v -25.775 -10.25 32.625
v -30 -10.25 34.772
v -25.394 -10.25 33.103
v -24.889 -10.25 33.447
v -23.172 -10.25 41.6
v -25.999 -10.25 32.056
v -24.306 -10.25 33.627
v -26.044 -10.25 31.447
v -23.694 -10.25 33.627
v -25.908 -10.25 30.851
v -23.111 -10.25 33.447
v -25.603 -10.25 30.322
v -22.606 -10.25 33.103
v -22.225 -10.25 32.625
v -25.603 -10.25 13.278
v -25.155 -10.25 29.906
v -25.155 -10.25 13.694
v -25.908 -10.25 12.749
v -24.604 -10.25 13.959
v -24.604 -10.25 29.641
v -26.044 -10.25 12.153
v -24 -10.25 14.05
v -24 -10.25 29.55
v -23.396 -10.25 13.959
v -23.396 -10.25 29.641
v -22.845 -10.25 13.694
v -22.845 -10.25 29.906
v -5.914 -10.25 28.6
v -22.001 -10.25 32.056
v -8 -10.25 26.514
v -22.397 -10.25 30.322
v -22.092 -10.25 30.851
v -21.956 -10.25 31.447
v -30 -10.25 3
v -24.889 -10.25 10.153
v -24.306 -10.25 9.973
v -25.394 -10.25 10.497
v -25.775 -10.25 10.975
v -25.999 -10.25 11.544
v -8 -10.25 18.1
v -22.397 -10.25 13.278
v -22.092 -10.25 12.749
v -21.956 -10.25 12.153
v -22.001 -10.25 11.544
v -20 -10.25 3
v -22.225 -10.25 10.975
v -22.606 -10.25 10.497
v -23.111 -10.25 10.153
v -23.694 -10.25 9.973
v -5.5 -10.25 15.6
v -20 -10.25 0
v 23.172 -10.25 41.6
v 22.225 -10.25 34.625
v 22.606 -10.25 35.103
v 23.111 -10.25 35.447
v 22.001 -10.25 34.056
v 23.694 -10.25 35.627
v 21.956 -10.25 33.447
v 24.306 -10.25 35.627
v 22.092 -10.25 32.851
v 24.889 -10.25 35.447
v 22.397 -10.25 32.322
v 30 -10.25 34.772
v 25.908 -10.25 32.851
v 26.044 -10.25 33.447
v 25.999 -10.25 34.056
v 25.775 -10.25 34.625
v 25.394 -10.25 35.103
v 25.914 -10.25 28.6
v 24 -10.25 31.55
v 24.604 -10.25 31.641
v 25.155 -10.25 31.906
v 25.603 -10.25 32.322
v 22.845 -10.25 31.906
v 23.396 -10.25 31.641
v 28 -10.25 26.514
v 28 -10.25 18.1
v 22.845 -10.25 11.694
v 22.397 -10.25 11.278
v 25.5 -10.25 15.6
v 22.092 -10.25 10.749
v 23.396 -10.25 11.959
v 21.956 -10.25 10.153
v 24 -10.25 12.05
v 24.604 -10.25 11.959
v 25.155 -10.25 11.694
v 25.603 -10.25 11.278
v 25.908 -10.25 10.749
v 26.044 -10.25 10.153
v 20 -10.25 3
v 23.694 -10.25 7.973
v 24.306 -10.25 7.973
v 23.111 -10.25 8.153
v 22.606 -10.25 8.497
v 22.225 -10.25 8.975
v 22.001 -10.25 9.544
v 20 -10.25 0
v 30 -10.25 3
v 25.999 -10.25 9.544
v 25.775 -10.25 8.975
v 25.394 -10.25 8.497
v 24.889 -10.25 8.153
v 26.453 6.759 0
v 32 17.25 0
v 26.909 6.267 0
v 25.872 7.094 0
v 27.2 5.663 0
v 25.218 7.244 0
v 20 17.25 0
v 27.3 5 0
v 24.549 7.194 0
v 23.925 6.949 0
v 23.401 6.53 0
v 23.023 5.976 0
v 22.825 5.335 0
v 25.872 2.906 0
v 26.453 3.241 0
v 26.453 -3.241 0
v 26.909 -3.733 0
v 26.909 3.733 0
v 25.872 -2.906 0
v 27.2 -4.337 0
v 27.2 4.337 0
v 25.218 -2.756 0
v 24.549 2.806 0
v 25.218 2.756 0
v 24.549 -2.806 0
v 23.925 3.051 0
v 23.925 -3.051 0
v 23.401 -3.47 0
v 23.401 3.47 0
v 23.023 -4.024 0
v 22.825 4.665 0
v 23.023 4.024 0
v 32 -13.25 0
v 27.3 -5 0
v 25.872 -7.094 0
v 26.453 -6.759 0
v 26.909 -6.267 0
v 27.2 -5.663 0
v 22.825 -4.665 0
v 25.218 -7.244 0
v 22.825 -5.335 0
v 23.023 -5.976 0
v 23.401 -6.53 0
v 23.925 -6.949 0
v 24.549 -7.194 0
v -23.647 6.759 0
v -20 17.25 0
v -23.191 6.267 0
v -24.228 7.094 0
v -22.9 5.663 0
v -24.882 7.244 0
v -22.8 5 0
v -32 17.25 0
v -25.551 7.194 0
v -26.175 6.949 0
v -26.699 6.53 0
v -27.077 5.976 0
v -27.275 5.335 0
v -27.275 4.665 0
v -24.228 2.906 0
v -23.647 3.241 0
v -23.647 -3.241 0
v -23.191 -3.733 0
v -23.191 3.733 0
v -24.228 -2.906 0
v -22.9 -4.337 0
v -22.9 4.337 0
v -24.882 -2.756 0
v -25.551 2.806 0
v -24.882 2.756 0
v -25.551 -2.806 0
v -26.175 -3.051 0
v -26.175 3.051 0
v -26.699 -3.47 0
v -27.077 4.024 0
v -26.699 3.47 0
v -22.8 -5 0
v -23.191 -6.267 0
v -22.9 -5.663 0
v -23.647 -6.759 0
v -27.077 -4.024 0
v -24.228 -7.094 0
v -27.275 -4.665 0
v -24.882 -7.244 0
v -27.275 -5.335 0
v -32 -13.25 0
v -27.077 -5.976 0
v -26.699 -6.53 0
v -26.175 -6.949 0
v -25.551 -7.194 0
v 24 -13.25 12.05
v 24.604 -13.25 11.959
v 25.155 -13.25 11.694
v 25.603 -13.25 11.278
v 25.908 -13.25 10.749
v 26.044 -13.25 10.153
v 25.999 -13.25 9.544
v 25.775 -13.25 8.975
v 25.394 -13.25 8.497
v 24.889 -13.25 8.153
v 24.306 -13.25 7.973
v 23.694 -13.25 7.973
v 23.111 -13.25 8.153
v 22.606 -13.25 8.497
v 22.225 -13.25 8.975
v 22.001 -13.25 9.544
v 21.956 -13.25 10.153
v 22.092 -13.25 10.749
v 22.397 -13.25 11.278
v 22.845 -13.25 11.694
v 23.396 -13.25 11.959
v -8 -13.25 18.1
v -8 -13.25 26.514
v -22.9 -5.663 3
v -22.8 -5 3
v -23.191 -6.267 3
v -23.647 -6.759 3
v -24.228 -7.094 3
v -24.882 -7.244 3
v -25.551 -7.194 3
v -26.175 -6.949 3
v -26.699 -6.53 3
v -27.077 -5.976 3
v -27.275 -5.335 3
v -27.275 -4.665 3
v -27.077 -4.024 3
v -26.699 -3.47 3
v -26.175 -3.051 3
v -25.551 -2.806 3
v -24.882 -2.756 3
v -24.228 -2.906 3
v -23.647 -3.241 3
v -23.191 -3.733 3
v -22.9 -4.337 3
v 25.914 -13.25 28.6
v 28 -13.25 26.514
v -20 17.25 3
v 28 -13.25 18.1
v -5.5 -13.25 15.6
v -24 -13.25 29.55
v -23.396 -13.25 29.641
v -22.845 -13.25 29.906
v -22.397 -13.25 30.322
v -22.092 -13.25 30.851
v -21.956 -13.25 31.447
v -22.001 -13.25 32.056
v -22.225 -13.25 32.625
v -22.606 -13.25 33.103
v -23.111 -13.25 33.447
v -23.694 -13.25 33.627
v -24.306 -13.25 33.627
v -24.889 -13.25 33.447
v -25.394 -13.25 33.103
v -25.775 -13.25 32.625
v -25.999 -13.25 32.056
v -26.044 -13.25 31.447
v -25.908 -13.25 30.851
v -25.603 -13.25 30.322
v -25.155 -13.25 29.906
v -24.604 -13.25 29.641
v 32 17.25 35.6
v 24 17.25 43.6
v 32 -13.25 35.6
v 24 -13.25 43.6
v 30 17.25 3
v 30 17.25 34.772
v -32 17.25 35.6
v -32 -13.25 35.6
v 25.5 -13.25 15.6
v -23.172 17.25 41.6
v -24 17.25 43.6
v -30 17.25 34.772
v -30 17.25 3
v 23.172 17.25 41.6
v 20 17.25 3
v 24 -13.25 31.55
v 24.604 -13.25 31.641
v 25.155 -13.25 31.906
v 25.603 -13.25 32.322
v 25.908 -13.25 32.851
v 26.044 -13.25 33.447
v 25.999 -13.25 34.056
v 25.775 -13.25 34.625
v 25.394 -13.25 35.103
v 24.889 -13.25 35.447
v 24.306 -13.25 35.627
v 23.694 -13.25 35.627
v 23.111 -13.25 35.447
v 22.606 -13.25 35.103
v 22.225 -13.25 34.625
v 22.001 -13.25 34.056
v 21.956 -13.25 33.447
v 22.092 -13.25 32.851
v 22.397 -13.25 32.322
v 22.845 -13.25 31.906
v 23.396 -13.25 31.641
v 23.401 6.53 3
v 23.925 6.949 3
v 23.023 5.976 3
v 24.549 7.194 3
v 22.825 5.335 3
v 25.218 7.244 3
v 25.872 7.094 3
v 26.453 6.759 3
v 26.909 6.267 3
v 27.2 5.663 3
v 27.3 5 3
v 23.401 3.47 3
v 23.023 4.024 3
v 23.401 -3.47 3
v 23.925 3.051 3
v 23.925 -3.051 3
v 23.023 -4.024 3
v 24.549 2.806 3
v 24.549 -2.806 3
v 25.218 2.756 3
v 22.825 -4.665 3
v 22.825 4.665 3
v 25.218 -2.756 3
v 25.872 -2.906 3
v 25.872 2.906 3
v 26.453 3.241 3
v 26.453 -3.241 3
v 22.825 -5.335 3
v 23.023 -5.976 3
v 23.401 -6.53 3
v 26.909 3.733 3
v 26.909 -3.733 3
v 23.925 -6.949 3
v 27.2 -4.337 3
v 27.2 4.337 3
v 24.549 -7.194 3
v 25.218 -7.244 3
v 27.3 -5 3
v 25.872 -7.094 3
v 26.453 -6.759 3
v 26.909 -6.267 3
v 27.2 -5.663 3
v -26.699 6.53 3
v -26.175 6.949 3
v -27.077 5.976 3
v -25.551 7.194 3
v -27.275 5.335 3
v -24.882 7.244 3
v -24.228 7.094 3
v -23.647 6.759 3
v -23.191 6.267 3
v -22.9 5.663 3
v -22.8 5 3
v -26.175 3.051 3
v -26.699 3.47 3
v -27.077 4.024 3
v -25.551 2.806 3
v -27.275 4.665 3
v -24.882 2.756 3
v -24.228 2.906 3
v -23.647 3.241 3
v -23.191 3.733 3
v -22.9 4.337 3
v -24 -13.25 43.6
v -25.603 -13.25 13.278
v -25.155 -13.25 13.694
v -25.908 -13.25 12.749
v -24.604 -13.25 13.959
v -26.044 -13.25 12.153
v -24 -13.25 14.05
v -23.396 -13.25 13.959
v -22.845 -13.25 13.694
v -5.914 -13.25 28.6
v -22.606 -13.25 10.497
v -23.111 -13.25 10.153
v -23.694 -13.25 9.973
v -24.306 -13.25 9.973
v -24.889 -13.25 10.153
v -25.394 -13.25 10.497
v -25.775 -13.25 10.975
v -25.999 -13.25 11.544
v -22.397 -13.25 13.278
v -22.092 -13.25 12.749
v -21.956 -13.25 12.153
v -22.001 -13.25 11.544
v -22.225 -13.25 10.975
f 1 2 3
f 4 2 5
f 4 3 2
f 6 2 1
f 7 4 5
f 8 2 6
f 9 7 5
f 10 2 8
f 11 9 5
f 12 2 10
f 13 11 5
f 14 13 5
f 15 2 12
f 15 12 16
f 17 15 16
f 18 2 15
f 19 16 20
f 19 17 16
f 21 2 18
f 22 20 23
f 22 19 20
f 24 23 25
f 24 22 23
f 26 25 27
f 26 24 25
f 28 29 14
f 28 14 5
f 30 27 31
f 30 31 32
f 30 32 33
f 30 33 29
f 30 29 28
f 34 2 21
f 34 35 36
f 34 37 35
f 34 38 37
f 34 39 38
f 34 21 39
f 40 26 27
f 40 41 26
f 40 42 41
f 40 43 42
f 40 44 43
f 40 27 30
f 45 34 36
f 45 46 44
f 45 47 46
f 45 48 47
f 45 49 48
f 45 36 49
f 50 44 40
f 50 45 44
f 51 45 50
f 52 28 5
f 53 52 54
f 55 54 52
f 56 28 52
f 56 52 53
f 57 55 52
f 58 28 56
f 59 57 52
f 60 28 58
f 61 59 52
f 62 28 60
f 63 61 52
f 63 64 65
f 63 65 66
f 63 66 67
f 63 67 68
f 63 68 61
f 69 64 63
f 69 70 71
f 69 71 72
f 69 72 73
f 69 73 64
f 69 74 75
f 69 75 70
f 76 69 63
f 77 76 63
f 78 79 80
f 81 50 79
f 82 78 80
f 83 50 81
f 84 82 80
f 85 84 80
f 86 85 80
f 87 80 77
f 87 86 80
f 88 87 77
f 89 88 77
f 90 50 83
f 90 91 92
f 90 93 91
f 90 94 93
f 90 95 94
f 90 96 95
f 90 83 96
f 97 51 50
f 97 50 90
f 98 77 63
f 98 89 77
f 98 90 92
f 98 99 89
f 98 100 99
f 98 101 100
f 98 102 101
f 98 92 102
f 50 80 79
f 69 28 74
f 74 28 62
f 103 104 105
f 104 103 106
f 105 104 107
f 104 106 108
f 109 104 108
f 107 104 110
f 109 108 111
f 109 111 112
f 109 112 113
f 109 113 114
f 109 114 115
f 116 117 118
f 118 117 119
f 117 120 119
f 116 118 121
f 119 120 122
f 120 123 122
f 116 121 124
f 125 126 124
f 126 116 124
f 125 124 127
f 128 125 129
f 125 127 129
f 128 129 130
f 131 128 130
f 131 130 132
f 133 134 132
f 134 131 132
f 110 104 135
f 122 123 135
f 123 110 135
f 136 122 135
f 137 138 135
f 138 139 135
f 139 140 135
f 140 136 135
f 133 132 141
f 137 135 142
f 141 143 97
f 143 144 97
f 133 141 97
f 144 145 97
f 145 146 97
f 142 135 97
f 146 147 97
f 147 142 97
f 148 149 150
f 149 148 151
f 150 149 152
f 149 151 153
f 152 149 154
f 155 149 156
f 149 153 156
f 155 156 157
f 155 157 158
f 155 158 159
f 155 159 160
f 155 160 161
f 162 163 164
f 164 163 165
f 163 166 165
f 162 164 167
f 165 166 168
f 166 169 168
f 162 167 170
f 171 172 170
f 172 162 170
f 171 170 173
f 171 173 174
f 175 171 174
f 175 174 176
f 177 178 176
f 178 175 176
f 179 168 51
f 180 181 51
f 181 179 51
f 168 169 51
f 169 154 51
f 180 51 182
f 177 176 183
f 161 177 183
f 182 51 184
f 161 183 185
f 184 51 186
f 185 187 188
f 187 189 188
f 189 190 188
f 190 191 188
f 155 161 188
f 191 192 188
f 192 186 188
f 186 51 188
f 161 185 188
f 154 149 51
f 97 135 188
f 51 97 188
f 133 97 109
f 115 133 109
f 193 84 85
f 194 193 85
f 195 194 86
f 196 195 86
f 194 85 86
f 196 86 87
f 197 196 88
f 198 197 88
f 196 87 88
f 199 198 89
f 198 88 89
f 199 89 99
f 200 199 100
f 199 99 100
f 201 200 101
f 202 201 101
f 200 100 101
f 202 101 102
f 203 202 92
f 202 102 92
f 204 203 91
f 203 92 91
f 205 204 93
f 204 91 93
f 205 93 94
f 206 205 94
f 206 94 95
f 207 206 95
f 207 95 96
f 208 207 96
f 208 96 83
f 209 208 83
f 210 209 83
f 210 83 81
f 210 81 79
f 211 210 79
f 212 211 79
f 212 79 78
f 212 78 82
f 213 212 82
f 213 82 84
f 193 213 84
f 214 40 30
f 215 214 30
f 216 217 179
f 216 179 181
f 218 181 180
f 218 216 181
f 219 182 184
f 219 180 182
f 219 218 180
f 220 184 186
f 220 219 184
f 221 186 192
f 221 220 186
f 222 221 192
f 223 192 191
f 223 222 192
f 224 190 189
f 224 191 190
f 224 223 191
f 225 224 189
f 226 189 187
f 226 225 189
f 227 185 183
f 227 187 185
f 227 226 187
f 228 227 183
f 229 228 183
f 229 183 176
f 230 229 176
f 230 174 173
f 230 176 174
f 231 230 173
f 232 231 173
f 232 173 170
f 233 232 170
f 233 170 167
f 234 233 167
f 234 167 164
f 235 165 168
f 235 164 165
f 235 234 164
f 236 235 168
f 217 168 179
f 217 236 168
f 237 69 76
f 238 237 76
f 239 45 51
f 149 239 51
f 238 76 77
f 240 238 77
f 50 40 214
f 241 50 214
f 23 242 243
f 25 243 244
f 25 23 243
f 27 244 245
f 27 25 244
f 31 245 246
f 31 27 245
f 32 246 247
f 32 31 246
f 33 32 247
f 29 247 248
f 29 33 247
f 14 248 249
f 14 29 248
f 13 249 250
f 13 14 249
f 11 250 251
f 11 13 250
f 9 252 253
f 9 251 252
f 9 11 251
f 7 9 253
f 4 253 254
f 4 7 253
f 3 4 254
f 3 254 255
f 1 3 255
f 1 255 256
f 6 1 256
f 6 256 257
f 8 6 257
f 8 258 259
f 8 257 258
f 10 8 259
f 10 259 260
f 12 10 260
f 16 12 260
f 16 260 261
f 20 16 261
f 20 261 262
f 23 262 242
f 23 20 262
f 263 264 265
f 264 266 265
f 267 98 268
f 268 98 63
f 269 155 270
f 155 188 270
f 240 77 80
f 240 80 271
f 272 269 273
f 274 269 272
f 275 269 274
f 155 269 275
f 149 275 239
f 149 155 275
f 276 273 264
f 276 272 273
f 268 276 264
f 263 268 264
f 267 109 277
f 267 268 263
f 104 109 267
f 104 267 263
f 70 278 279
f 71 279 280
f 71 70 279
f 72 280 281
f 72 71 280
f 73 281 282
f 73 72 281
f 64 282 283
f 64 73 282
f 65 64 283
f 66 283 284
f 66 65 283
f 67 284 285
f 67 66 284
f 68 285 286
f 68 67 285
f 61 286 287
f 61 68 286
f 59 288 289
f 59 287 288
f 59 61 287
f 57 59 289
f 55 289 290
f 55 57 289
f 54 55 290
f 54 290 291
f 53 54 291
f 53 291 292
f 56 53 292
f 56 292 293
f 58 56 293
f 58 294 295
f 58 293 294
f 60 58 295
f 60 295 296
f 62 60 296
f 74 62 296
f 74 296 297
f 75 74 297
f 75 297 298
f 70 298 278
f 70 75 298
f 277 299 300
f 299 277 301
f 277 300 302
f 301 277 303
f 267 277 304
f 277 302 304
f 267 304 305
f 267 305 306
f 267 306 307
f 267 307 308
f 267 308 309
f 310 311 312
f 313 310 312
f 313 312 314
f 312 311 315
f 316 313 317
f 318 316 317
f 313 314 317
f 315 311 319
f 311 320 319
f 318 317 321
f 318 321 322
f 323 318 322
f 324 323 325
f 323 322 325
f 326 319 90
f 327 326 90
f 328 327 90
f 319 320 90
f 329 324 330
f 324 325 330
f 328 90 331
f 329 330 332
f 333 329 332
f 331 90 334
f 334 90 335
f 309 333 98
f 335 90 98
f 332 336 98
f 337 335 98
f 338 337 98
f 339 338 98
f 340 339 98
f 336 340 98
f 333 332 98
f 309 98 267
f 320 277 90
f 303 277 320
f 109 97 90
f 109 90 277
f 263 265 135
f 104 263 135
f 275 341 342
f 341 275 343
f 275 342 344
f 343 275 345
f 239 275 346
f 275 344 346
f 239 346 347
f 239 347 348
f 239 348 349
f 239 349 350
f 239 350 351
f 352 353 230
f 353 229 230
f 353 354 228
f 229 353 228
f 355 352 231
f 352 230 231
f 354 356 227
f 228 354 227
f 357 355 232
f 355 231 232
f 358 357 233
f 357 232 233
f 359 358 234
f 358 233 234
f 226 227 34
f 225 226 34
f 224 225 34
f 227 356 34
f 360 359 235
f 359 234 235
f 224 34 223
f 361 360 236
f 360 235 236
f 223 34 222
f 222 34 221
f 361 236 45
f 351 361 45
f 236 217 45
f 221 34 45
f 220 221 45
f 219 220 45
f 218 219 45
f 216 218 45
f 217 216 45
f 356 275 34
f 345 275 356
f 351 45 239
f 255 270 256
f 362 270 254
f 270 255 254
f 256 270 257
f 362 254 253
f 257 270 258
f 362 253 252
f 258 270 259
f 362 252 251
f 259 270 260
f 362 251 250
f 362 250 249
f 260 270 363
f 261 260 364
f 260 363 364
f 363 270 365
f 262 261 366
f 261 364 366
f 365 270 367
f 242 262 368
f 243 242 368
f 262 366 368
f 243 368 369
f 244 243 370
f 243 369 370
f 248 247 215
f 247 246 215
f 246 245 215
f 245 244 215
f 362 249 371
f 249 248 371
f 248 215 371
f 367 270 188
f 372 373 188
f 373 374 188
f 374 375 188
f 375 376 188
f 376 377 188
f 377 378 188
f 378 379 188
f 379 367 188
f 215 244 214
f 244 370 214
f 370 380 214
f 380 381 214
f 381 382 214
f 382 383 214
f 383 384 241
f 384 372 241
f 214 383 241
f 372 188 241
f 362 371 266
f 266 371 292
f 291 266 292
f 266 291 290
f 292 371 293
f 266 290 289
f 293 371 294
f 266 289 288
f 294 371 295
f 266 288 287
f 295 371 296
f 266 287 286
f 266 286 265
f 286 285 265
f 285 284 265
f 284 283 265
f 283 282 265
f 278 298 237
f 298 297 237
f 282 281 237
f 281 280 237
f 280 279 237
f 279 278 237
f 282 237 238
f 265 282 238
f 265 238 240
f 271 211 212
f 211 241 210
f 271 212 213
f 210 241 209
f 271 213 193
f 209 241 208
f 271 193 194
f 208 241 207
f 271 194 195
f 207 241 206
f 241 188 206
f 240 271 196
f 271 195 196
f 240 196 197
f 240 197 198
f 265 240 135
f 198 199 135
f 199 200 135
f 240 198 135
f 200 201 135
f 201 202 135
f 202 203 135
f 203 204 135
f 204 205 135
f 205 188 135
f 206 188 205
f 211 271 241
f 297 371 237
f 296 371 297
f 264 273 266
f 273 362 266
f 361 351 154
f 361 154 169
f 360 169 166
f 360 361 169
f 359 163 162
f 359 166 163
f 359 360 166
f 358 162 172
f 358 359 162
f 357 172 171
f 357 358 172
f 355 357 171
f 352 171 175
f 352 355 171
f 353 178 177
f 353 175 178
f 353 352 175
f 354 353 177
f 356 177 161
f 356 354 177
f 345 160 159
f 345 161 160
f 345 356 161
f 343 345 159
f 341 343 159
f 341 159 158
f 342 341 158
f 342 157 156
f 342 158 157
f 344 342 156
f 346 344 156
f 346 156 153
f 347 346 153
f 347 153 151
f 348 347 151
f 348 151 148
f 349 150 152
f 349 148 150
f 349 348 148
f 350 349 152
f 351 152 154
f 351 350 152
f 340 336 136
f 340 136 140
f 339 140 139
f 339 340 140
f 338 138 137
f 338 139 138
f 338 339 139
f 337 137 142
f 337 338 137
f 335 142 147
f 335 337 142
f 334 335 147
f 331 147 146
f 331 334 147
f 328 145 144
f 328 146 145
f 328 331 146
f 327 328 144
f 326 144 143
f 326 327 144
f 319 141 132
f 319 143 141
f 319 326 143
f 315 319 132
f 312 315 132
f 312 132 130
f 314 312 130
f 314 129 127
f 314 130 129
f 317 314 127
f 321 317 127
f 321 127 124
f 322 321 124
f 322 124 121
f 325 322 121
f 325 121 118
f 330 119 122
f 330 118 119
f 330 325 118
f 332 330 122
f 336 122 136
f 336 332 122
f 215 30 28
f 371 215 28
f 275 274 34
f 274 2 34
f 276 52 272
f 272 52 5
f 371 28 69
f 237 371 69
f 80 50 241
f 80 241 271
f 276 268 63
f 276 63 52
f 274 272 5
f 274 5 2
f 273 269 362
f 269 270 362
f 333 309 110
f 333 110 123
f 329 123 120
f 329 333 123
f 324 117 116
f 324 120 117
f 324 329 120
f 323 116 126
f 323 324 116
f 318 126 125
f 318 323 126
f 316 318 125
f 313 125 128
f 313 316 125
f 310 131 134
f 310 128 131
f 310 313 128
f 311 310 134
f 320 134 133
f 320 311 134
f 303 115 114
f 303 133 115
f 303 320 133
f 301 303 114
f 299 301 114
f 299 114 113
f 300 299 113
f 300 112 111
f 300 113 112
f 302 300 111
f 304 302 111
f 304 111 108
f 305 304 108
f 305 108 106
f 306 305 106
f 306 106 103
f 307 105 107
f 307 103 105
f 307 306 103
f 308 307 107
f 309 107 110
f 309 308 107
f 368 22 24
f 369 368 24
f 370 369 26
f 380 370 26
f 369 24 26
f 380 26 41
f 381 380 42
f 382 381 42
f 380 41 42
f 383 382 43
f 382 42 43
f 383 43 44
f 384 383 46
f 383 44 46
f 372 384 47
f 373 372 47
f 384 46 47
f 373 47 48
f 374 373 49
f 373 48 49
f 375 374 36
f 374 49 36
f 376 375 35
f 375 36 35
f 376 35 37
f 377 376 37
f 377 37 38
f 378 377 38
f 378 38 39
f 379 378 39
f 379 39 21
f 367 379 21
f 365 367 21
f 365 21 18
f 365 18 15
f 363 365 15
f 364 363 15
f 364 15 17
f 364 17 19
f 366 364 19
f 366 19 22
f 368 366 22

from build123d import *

# Parameters (mm, degrees)
SKETCH1_W               = 12
SKETCH1_H               = 20.5
ARM_MOUNTS_DEPTH        = 3
ARM_MOUNTS_2_DEPTH      = 3
ARM_HOLES_DEPTH         = 34.735181932
ARM_HOLES_DEPTH_BACK    = 3
SKETCH2_R               = 2.25
SKETCH3_W               = 64
SKETCH3_H               = 3
BOTTOM_PLATE_DEPTH      = 28
SIDE_RIBS_DEPTH         = 2
SKETCH5_W               = 36
SKETCH5_H               = 12
CUT_EXTRUDE2_DEPTH      = 10
SKETCH6_R               = 2.05
MOUNTING_HOLES_DEPTH    = 10
CUT_EXTRUDE4_DEPTH      = 48.204343021
CUT_EXTRUDE4_DEPTH_BACK = 48.204343021
SKETCH8_W               = 64
SKETCH8_H               = 6.2
SKETCH10_W              = 64
SKETCH10_H              = 21.8
BOSS_EXTRUDE7_DEPTH     = 3
CHAMFER3_SIZE           = 5
CHAMFER4_SIZE           = 2.5
CHAMFER5_SIZE           = 8
CUT_EXTRUDE5_DEPTH      = 10
BOSS_EXTRUDE8_DEPTH     = 20.5
BOSS_EXTRUDE9_DEPTH     = 7


with BuildPart() as part:
    # Sketch1 → Arm Mounts (new body)
    with BuildSketch(Plane.XY):
        with Locations((26, 0)):
            Rectangle(SKETCH1_W, SKETCH1_H)
    extrude(amount=ARM_MOUNTS_DEPTH)


with BuildPart() as body_2:
    # Sketch1 → Arm Mounts 2 (new body)
    with BuildSketch(Plane.XY):
        with Locations((-26, 0)):
            Rectangle(SKETCH1_W, SKETCH1_H)
    extrude(amount=ARM_MOUNTS_2_DEPTH)


with BuildPart() as arm_holes_tool:
    # Sketch2 → Arm Holes (new, two sides: drawn at the far end of the back side and taken through both)
    with BuildSketch(Plane(origin=(0, 0, 3), x_dir=(-1, 0, 0), z_dir=(0, 0, -1)).offset(-ARM_HOLES_DEPTH_BACK)):
        with Locations(Location((25.05, 5, 0), (0, 0, 180))):
            Circle(SKETCH2_R)
        with Locations(Location((25.05, -5, 0), (0, 0, 180))):
            Circle(SKETCH2_R)
        with Locations(Location((-25.05, -5, 0), (0, 0, 180))):
            Circle(SKETCH2_R)
        with Locations(Location((-25.05, 5, 0), (0, 0, 180))):
            Circle(SKETCH2_R)
    extrude(amount=ARM_HOLES_DEPTH + ARM_HOLES_DEPTH_BACK)


with BuildPart() as part_1:
    add(part.part)

    # Arm Holes: cut by arm_holes_tool
    add(arm_holes_tool.part, mode=Mode.SUBTRACT)



with BuildPart() as body_2_1:
    add(body_2.part)

    # Arm Holes: cut by arm_holes_tool
    add(arm_holes_tool.part, mode=Mode.SUBTRACT)


with BuildPart() as part_2:
    add(part_1.part)

    add(body_2_1.part)  # Bottom Plate merges body 2
    # Sketch3 → Bottom Plate (add)
    with BuildSketch(Plane(origin=(0, 0, 0), x_dir=(-1, 0, 0), z_dir=(0, 0, -1))):
        with Locations((0, -11.75)):
            Rectangle(SKETCH3_W, SKETCH3_H)
    extrude(amount=-BOTTOM_PLATE_DEPTH)

    # Sketch4 → Side Ribs (add)
    with BuildSketch(Plane.ZY.offset(32)):
        Polygon((3, 10.25), (28, -10.25), (3, -10.25), align=None)
    side_ribs = extrude(amount=-SIDE_RIBS_DEPTH)

    # Rib Mirror: Side Ribs across plane
    add(side_ribs.mirror(Plane(origin=(0, 0, 0), x_dir=(0, 0, 1), z_dir=(1, 0, 0))))

    # Sketch5 → Cut-Extrude2 (cut)
    with BuildSketch(Plane(origin=(0, -10.25, 0), x_dir=(1, 0, 0), z_dir=(0, 1, 0))):
        with Locations((10, -22)):
            Rectangle(SKETCH5_W, SKETCH5_H)
    cut_extrude2 = extrude(amount=-CUT_EXTRUDE2_DEPTH, mode=Mode.SUBTRACT)

    # Sketch6 → Mounting Holes (cut)
    with BuildSketch(Plane(origin=(0, -10.25, 0), x_dir=(1, 0, 0), z_dir=(0, 1, 0))):
        with Locations(Location((-24, -12, 0), (0, 0, 270))):
            Circle(SKETCH6_R)
        with Locations(Location((24, -10, 0), (0, 0, 270))):
            Circle(SKETCH6_R)
    mounting_holes = extrude(amount=-MOUNTING_HOLES_DEPTH, mode=Mode.SUBTRACT)

    # Sketch8 → Cut-Extrude4 (cut, two sides: drawn at the far end of the back side and taken through both)
    with BuildSketch(Plane(origin=(0, -10.25, 0), x_dir=(1, 0, 0), z_dir=(0, 1, 0)).offset(-CUT_EXTRUDE4_DEPTH_BACK)):
        with Locations((0, -24.9)):
            Rectangle(SKETCH8_W, SKETCH8_H)
    extrude(amount=CUT_EXTRUDE4_DEPTH + CUT_EXTRUDE4_DEPTH_BACK, mode=Mode.SUBTRACT)

    # Sketch10 → Boss-Extrude7 (add)
    with BuildSketch(Plane(origin=(0, -10.25, 0), x_dir=(1, 0, 0), z_dir=(0, 1, 0))):
        with Locations((0, -32.7)):
            Rectangle(SKETCH10_W, SKETCH10_H)
    extrude(amount=-BOSS_EXTRUDE7_DEPTH)

    # Mirror5: Cut-Extrude2, Mounting Holes across plane
    add(cut_extrude2.mirror(Plane.XY.offset(21.8)), mode=Mode.SUBTRACT)
    add(mounting_holes.mirror(Plane.XY.offset(21.8)), mode=Mode.SUBTRACT)

    # Chamfer3
    chamfer3_edges = [part_2.edges().sort_by_distance(p)[0] for p in [
        (31, -10.25, 21.8),
        (-31, -10.25, 21.8),
    ]]
    chamfer(chamfer3_edges, length=CHAMFER3_SIZE)

    # Chamfer4
    chamfer4_edges = [part_2.edges().sort_by_distance(p)[0] for p in [
        (28, -11.75, 15.6),
        (28, -11.75, 27.6),
        (-8, -11.75, 27.6),
        (-8, -11.75, 15.6),
    ]]
    chamfer(chamfer4_edges, length=CHAMFER4_SIZE)

    # Chamfer5
    chamfer5_edges = [part_2.edges().sort_by_distance(p)[0] for p in [
        (32, -11.75, 43.6),
        (-32, -11.75, 43.6),
    ]]
    chamfer(chamfer5_edges, length=CHAMFER5_SIZE)

    # Sketch11 → Cut-Extrude5 (cut)
    with BuildSketch(Plane(origin=(0, -10.25, 0), x_dir=(1, 0, 0), z_dir=(0, 1, 0))):
        Polygon((-8, -25.1), (-8, -26.514213562), (-5.914213562, -28.6), (25.914213562, -28.6), (28, -26.514213562), (28, -25.1), align=None)
    extrude(amount=-CUT_EXTRUDE5_DEPTH, mode=Mode.SUBTRACT)

    # Sketch12 → Boss-Extrude8 (add)
    with BuildSketch(Plane(origin=(0, -10.25, 0), x_dir=(1, 0, 0), z_dir=(0, 1, 0))):
        Polygon((-32, -26.8), (-32, -3), (-30, -3), (-30, -26.8), (-30, -34.771572875), (-23.171572875, -41.6), (23.171572875, -41.6), (30, -34.771572875), (30, -26.8), (30, -3), (32, -3), (32, -26.8), (32, -35.6), (24, -43.6), (-24, -43.6), (-32, -35.6), align=None)
    extrude(amount=BOSS_EXTRUDE8_DEPTH)

    # Sketch13 → Boss-Extrude9 (add)
    with BuildSketch(Plane(origin=(0, 10.25, 0), x_dir=(1, 0, 0), z_dir=(0, 1, 0))):
        Polygon((-20, 0), (-32, 0), (-32, -35.6), (-24, -43.6), (24, -43.6), (32, -35.6), (32, 0), (20, 0), (20, -3), (30, -3), (30, -34.771572875), (23.171572875, -41.6), (-23.171572875, -41.6), (-30, -34.771572875), (-30, -3), (-20, -3), align=None)
    extrude(amount=BOSS_EXTRUDE9_DEPTH)


solid = part_2.part
